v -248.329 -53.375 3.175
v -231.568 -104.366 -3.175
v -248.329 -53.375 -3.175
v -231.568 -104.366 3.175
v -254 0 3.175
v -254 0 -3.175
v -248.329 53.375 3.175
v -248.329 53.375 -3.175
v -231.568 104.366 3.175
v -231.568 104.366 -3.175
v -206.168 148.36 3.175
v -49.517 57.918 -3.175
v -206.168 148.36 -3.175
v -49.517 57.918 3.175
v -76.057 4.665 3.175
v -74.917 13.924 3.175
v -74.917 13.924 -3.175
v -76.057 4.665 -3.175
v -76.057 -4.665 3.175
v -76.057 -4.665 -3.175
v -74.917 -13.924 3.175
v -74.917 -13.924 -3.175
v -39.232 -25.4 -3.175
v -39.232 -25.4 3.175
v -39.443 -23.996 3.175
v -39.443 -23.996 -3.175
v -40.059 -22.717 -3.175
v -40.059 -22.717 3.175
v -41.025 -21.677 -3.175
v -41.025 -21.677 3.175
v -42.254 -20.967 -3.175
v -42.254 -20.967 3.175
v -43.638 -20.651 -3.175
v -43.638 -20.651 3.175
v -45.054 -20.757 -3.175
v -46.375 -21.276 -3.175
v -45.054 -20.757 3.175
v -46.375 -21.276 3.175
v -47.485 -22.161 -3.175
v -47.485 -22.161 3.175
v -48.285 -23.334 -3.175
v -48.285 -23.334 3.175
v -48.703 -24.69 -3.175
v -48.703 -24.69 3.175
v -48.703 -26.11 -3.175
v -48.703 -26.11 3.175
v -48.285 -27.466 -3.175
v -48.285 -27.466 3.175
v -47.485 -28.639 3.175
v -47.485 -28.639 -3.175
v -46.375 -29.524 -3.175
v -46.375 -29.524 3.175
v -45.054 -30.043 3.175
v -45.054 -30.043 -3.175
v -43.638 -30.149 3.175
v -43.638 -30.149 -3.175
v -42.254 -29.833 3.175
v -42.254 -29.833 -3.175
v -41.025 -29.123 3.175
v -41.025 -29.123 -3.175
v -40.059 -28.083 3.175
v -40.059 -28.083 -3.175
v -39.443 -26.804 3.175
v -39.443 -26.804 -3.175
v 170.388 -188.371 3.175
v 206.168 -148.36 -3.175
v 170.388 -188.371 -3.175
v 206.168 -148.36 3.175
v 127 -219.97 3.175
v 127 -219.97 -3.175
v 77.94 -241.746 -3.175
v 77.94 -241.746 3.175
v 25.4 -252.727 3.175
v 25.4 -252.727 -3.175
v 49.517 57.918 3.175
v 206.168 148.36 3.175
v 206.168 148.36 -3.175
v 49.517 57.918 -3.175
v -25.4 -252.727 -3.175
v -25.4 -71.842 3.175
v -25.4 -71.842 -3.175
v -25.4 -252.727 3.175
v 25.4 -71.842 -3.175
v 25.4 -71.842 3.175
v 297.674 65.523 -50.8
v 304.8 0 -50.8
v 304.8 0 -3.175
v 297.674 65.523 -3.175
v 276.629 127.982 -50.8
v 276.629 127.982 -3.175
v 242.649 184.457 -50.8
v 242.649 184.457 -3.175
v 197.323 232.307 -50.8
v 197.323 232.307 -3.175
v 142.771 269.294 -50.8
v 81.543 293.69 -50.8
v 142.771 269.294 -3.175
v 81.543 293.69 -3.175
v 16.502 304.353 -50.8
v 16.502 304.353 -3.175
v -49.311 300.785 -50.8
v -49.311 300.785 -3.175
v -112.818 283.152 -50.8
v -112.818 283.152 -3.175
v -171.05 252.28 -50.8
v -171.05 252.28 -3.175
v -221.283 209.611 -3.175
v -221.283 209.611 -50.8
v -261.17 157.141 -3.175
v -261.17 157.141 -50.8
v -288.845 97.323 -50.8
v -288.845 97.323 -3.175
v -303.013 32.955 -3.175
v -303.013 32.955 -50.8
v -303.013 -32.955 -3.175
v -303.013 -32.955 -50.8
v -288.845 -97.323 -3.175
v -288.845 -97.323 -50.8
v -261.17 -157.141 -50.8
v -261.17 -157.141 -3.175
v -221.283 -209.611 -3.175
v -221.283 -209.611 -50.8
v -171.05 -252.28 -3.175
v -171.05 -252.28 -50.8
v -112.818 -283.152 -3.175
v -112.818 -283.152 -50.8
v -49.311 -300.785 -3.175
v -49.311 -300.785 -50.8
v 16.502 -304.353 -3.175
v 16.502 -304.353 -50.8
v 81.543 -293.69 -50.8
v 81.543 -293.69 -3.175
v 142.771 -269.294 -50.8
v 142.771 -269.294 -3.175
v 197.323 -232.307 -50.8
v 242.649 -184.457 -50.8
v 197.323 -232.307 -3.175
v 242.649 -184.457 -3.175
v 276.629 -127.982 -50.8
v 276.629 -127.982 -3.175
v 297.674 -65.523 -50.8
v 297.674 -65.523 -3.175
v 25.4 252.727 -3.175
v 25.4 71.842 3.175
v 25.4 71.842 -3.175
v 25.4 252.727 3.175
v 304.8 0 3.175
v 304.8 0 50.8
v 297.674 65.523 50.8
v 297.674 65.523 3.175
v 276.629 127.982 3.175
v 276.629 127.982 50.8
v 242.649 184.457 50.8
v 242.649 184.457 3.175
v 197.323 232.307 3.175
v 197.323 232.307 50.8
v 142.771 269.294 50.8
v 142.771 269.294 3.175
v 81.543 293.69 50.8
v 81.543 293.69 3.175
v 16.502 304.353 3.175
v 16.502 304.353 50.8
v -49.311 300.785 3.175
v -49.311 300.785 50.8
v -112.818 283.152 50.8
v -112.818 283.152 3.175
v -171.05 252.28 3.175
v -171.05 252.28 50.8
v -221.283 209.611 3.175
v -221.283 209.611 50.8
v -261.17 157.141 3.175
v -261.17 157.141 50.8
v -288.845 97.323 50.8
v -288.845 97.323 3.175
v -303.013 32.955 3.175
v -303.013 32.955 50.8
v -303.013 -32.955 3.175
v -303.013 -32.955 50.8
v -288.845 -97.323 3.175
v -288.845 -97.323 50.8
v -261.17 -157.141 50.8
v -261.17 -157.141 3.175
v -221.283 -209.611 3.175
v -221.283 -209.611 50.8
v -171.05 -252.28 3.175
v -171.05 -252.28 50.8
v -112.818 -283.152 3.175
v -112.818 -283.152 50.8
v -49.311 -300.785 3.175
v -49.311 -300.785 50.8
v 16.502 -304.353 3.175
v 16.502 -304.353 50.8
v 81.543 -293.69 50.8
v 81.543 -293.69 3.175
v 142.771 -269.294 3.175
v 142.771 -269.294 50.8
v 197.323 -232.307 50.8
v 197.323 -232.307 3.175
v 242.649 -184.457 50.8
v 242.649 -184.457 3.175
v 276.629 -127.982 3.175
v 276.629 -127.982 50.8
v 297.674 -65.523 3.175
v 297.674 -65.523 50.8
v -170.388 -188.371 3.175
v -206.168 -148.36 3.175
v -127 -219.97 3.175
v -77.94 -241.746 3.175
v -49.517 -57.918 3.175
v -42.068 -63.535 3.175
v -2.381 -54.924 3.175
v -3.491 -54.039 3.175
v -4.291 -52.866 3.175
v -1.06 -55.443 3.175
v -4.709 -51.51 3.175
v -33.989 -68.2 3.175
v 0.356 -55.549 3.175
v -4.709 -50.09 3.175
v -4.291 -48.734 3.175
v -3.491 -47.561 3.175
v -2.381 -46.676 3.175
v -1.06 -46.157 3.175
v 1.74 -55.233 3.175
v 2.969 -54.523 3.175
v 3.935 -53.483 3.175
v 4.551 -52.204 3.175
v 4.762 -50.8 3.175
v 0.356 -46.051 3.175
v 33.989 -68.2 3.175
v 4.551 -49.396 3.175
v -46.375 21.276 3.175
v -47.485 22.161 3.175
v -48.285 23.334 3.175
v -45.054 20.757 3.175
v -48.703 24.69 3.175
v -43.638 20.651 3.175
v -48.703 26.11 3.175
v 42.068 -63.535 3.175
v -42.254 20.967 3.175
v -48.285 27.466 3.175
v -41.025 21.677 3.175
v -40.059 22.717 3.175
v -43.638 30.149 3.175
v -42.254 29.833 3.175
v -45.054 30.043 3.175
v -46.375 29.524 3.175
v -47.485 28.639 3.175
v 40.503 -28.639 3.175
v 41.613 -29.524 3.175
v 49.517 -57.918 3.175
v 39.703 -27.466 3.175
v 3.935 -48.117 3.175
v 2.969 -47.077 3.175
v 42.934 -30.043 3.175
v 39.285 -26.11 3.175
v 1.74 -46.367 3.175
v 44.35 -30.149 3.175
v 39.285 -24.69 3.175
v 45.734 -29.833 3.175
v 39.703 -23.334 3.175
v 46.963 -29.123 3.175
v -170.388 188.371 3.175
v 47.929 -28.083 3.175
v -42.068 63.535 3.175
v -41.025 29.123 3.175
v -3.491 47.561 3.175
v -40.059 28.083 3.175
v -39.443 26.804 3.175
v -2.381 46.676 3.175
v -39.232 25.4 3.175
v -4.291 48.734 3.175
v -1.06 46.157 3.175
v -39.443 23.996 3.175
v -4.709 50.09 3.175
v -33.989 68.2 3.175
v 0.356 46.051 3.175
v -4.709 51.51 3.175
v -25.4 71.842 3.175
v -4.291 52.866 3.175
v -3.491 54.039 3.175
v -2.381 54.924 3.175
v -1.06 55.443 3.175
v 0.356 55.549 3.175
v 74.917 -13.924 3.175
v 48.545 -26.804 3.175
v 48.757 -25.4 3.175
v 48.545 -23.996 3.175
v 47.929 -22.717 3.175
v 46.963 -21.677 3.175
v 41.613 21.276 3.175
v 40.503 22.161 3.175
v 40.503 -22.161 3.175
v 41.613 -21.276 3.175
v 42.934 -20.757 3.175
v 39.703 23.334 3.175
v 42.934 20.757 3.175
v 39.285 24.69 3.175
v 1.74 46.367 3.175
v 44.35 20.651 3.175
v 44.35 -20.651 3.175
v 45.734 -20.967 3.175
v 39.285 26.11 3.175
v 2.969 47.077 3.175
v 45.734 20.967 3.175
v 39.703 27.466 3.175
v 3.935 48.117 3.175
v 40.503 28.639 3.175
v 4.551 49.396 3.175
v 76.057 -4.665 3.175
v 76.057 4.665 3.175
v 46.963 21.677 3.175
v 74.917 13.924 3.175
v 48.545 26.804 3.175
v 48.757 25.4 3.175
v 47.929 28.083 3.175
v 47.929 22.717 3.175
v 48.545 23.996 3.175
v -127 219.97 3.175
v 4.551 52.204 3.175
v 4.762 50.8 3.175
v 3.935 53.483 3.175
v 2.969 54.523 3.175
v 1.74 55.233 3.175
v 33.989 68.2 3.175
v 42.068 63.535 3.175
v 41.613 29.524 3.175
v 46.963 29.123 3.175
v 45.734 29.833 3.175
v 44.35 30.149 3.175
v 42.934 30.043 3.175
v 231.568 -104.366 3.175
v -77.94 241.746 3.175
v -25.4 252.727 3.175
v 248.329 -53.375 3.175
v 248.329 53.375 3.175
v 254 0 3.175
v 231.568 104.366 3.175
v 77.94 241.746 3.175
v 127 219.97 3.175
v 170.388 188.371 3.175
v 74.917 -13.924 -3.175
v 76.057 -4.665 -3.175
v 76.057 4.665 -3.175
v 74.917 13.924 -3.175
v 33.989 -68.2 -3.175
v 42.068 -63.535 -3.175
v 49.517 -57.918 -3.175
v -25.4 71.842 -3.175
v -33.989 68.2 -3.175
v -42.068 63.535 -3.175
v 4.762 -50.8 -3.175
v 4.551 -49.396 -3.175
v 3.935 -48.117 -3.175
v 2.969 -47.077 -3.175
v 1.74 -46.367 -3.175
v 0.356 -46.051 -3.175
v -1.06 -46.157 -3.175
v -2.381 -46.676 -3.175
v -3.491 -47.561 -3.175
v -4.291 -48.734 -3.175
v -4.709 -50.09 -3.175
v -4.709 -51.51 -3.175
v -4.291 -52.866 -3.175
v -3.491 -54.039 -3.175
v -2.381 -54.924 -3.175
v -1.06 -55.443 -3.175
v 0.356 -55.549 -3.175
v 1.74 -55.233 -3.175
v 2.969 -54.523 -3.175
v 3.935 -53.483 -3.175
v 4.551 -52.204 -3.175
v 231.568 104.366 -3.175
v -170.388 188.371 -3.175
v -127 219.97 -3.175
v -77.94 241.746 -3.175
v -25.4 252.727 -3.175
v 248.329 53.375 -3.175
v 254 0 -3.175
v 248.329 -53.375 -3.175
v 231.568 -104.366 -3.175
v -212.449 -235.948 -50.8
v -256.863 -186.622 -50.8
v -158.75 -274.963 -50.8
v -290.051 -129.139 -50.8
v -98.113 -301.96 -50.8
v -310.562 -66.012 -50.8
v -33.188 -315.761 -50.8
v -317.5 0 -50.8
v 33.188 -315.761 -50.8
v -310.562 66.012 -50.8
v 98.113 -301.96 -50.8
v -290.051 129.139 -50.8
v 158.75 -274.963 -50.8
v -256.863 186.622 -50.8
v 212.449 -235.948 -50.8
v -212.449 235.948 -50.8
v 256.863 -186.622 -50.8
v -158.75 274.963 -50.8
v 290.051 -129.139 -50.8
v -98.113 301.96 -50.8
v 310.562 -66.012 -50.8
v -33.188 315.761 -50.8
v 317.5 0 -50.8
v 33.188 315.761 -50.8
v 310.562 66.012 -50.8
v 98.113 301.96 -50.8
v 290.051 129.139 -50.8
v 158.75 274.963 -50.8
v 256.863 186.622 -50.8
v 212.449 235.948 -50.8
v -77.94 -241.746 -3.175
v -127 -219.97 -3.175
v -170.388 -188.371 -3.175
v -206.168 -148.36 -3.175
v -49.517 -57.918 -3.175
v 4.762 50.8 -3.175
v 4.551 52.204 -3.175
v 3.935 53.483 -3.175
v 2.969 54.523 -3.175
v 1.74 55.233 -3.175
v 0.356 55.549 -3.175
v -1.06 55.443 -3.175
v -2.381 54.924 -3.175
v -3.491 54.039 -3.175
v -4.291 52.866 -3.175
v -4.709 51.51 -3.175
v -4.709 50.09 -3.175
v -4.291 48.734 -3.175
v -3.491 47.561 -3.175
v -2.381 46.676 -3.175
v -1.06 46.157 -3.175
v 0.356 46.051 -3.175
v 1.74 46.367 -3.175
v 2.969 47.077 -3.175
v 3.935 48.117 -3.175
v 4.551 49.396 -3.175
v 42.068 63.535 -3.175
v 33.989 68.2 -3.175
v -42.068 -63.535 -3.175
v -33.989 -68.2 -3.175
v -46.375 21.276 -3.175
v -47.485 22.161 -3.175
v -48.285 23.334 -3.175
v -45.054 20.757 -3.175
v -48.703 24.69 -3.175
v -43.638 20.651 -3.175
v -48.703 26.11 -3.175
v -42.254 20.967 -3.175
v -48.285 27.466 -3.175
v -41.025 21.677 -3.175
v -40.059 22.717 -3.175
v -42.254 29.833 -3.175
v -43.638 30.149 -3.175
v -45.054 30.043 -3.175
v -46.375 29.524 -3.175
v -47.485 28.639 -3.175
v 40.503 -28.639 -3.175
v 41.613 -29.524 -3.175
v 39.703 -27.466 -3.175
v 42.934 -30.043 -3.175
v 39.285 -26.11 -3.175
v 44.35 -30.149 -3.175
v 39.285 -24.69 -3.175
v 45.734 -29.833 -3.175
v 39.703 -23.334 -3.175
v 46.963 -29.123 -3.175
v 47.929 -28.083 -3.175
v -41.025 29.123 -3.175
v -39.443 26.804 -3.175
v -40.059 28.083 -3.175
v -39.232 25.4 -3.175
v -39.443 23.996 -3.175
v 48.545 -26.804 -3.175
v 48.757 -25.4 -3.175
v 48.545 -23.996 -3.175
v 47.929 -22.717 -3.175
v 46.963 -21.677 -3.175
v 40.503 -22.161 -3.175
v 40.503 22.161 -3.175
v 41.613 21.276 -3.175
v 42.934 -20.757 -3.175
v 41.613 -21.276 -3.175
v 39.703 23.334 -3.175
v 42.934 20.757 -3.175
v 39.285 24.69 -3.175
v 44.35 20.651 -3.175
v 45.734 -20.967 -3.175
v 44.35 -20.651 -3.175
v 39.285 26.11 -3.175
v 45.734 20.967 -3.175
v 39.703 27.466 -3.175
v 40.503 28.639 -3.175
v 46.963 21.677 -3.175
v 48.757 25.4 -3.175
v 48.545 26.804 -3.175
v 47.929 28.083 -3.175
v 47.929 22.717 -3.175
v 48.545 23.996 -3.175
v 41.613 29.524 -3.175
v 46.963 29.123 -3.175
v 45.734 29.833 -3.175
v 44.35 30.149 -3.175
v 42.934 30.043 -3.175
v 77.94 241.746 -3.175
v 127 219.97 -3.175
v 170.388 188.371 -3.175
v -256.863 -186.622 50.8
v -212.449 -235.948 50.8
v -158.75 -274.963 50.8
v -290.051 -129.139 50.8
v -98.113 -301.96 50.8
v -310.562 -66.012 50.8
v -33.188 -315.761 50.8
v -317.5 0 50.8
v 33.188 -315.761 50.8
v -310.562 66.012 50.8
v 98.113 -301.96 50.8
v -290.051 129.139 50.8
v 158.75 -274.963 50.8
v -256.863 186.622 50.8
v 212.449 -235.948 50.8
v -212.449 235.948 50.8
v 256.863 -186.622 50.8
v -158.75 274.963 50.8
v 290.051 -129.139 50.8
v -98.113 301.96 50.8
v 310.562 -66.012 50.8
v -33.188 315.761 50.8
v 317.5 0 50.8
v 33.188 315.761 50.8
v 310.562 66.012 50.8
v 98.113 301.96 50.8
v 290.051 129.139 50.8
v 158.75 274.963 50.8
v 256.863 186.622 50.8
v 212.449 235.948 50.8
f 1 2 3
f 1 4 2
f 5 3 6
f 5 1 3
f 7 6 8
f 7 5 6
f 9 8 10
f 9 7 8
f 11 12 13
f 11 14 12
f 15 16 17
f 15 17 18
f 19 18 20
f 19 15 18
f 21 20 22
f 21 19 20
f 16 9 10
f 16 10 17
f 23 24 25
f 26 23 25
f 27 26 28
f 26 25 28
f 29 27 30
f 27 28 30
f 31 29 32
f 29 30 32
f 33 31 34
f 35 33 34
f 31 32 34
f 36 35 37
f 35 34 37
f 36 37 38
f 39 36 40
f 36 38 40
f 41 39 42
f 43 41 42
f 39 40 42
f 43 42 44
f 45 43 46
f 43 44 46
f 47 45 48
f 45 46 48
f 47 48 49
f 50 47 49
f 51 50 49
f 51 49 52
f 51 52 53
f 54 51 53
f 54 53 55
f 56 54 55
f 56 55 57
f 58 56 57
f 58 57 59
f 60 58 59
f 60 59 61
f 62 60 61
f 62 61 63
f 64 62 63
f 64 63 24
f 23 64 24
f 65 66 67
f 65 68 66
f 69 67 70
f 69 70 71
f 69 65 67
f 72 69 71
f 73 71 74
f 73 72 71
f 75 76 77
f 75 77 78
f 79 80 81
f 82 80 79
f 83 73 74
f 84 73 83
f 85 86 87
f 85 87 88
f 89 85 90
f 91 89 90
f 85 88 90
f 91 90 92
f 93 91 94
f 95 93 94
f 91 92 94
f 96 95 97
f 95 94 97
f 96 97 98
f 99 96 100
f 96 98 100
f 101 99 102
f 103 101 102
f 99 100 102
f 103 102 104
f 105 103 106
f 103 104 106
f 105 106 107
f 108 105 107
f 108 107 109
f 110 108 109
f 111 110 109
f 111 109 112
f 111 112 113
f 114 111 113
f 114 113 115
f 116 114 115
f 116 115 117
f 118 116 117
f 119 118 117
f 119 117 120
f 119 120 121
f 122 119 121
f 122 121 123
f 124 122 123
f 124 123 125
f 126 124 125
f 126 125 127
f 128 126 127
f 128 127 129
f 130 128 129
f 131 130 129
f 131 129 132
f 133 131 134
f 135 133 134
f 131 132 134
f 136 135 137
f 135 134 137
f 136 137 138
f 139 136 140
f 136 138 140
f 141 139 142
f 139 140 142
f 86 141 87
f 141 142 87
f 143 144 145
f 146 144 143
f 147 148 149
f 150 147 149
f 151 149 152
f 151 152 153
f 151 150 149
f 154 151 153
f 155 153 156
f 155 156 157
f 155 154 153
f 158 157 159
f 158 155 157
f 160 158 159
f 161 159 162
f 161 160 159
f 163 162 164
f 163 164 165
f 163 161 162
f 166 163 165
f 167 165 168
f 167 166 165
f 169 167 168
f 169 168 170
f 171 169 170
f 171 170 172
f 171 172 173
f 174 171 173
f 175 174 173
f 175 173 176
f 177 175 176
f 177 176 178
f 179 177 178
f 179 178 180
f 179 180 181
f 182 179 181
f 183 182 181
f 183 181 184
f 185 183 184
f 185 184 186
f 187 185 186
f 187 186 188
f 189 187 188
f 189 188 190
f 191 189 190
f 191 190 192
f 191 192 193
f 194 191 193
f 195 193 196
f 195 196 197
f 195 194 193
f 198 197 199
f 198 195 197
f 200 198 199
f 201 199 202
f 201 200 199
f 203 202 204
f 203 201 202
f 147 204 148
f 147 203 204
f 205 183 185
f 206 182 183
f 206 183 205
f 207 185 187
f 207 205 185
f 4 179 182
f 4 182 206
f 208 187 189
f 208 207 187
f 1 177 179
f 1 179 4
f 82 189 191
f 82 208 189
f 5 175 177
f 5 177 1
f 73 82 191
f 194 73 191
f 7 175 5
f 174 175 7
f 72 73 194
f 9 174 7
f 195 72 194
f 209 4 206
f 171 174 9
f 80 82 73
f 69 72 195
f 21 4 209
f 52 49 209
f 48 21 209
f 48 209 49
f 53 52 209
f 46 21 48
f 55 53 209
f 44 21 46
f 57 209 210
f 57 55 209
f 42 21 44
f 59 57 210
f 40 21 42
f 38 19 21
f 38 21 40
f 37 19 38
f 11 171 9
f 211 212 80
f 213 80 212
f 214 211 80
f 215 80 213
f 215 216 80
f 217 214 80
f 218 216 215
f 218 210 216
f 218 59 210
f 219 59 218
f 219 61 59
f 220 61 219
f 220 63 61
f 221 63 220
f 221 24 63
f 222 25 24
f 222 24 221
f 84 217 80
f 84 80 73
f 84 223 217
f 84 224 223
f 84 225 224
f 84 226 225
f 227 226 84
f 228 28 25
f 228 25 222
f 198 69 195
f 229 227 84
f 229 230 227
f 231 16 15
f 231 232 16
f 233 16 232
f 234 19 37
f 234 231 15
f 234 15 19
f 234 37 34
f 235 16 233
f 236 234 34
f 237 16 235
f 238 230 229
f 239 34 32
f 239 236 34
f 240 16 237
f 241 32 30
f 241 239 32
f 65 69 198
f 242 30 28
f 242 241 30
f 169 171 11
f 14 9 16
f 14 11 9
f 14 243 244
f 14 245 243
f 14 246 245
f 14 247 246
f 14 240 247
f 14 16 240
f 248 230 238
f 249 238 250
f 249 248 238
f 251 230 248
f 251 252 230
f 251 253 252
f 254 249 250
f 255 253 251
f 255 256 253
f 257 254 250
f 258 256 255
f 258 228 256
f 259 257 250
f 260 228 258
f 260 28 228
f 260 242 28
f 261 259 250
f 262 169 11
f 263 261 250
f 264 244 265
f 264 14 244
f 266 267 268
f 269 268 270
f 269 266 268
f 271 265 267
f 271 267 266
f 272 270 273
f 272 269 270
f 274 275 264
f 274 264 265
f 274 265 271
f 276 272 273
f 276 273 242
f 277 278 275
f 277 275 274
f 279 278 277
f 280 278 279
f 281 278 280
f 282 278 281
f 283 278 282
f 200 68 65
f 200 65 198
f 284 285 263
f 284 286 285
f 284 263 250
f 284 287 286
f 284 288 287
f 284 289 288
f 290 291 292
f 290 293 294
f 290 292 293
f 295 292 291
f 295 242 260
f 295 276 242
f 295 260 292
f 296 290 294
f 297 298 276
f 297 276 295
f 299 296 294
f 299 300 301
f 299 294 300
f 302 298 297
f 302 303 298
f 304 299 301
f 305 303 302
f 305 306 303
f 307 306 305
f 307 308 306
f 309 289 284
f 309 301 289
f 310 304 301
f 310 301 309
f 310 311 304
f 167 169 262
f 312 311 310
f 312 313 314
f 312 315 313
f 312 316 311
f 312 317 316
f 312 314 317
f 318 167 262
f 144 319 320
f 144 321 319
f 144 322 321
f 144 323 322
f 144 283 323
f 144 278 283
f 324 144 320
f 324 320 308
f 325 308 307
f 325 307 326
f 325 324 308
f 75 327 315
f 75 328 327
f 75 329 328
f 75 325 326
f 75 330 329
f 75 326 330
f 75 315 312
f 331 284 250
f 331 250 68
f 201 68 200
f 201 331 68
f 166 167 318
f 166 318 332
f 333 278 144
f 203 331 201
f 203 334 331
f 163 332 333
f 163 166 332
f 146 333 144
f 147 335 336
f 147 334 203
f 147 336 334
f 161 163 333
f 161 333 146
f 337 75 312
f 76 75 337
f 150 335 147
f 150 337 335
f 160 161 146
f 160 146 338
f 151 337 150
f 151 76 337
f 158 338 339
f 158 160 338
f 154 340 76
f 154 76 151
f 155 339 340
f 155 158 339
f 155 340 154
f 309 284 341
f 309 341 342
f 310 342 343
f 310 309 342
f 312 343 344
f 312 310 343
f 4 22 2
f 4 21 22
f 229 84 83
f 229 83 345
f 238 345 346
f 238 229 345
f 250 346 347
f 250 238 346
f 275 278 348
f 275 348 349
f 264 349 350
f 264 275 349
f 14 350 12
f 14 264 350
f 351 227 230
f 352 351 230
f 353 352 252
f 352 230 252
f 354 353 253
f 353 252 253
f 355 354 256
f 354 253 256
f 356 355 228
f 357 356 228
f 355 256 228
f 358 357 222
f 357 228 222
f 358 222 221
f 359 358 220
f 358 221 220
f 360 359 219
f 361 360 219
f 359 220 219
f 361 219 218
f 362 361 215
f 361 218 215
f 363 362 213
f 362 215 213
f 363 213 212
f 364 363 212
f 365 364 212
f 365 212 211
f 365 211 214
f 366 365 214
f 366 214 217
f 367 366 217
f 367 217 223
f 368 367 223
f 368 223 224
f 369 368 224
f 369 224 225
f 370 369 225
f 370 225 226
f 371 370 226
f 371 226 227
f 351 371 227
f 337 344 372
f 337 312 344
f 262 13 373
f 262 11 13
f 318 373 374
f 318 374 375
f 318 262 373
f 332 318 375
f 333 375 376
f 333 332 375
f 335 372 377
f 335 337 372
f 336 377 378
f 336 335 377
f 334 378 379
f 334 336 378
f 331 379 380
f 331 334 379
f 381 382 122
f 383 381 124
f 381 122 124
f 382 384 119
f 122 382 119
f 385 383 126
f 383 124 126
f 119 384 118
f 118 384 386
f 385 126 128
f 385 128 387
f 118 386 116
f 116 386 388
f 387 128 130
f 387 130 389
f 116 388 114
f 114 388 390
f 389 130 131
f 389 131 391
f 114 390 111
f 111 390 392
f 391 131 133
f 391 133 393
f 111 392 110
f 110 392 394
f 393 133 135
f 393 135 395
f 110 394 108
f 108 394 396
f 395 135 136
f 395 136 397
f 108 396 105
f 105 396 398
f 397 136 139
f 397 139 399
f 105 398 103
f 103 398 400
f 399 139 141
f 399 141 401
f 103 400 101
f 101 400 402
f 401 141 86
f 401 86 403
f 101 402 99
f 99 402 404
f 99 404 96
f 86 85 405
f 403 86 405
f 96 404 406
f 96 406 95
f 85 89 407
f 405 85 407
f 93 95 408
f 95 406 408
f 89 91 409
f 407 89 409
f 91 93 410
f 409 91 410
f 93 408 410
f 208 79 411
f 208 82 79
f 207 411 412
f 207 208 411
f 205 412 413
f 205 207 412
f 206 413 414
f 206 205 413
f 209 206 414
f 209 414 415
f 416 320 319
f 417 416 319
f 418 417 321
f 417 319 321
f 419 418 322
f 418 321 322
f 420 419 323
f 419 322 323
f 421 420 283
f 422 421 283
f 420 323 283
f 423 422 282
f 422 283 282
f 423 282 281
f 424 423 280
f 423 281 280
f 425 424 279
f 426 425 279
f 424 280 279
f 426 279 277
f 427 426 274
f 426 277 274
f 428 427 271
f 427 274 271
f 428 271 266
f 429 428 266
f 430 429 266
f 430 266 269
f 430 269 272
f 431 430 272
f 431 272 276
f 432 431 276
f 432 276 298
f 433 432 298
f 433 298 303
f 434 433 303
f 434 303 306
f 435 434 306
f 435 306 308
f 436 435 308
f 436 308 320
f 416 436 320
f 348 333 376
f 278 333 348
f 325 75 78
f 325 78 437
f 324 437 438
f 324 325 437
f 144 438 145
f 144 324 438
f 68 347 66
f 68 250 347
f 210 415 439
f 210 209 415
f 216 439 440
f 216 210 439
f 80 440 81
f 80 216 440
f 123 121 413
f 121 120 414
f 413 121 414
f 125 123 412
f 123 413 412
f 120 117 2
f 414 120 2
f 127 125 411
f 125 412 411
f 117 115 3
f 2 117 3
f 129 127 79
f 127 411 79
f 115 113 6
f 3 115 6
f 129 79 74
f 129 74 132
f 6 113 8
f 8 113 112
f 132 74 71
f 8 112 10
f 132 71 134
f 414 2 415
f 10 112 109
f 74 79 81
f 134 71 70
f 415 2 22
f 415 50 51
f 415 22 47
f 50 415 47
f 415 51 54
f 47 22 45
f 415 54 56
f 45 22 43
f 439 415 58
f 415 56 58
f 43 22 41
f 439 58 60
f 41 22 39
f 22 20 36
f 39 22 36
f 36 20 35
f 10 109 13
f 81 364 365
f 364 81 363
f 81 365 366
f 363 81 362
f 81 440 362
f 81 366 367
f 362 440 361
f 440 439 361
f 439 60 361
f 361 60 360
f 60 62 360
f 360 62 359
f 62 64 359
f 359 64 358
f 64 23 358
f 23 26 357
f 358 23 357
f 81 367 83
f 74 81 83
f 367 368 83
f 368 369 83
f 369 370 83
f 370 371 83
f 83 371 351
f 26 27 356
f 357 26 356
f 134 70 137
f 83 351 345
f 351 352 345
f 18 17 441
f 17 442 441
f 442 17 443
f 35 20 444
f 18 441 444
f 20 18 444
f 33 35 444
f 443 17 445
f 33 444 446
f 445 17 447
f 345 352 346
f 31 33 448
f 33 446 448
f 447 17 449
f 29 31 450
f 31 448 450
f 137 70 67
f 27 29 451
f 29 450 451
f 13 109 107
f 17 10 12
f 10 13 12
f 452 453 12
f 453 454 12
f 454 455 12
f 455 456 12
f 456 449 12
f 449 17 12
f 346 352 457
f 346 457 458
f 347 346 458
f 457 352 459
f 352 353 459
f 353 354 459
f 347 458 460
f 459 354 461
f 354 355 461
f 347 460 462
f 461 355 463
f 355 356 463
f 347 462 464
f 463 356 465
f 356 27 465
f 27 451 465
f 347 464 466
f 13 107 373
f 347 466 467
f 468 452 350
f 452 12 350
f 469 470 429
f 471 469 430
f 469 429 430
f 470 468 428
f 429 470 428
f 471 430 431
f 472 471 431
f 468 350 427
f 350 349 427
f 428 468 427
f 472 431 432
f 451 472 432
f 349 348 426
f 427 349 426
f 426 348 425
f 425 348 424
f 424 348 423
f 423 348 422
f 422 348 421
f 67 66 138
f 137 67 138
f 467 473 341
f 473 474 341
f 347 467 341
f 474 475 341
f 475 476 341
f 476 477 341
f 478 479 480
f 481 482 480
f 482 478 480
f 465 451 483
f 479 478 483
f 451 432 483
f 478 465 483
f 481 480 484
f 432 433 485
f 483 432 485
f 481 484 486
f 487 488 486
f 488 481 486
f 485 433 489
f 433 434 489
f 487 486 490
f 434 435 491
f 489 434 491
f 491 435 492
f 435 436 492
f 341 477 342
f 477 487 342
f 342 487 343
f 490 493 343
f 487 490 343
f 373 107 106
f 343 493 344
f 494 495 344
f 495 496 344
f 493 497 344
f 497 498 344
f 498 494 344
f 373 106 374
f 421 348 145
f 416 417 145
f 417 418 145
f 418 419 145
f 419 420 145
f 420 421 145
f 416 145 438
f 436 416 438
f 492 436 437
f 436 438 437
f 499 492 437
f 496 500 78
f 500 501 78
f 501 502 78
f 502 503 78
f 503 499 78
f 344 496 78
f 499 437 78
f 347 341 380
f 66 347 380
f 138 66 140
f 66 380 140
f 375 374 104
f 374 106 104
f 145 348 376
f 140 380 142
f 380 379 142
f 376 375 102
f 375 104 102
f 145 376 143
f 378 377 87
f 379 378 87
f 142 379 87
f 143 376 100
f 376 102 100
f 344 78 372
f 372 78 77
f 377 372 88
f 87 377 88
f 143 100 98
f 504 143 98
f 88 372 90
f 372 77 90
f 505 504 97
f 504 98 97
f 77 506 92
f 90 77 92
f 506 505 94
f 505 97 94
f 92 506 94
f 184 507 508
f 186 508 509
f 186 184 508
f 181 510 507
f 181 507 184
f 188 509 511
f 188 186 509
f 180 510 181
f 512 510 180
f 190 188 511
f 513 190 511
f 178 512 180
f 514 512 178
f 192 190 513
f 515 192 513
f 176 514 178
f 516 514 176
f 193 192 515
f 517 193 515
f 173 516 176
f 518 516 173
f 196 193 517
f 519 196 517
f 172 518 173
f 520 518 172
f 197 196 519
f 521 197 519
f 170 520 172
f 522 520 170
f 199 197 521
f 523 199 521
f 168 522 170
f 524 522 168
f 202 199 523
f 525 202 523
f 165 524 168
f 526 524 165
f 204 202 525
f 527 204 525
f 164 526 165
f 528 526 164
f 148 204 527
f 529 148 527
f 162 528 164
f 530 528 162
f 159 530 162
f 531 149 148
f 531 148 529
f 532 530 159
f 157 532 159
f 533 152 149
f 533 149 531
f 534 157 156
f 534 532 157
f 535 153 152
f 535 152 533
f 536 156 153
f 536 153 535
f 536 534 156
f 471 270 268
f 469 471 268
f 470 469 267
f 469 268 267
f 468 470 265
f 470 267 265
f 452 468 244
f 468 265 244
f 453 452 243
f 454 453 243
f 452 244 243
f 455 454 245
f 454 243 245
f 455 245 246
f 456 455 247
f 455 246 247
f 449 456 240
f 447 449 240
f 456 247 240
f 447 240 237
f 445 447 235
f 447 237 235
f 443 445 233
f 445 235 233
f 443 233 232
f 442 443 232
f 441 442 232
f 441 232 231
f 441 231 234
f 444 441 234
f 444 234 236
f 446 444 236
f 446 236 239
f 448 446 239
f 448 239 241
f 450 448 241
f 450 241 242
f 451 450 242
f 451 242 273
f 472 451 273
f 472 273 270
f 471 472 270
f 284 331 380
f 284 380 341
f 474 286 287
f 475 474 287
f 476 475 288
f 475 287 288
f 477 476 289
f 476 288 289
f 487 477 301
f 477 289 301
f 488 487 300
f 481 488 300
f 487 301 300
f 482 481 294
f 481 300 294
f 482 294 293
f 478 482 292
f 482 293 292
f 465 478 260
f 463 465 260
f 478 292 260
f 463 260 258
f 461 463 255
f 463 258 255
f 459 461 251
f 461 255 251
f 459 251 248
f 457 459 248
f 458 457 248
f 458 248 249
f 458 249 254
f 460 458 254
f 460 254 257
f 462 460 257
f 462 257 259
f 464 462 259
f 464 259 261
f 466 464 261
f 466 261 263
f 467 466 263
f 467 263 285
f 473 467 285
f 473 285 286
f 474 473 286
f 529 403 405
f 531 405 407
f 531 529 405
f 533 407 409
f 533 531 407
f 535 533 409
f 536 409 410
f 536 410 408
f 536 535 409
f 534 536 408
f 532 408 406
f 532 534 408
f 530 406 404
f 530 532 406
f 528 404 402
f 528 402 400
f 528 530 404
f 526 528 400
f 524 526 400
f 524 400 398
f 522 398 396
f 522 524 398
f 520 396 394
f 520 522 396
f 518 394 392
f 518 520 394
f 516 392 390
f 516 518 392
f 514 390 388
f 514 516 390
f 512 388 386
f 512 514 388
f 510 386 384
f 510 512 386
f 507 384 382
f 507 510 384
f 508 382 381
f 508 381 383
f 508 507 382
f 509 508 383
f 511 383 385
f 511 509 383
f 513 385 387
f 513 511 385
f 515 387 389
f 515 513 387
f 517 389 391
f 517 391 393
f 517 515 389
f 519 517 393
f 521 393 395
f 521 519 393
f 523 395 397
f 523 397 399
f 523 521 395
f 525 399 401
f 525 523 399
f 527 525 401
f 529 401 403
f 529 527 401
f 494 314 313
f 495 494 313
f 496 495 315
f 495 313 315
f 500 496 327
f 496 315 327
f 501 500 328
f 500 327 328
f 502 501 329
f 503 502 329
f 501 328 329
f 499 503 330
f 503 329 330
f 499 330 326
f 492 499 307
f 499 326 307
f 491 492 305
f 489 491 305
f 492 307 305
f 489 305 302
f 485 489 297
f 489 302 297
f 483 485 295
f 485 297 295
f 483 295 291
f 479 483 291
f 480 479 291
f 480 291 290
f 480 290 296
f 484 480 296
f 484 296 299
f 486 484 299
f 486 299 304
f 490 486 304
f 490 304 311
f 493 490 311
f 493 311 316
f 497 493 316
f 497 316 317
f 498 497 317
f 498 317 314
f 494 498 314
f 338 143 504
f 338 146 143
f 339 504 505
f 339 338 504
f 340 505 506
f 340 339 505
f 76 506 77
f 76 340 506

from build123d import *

# Parameters (mm, degrees)
BOSS_EXTRUDE1_DEPTH      = 3.175
BOSS_EXTRUDE1_DEPTH_BACK = 3.175
SKETCH2_R                = 304.8
BOSS_EXTRUDE2_DEPTH      = 50.8
BOSS_EXTRUDE2_DEPTH_BACK = 50.8
SKETCH5_R                = 317.5
SKETCH5_R_2              = 304.8
SKETCH6_R                = 4.7625
CUT_EXTRUDE1_DEPTH       = 453.245288118


with BuildPart() as part:
    # Sketch2 → Boss-Extrude1 (new, two sides: drawn at the far end of the back side and taken through both)
    with BuildSketch(Plane.XY.offset(-BOSS_EXTRUDE1_DEPTH_BACK)):
        Circle(SKETCH2_R)
        with BuildLine():
            ThreePointArc((25.4, -71.842048969), (38.1, -65.991135768), (49.517039467, -57.91806974))
            Line((49.517039467, -57.91806974), (206.167836833, -148.360449769))
            ThreePointArc((206.167836833, -148.360449769), (127, -219.970452561), (25.4, -252.726809025))
            Line((25.4, -252.726809025), (25.4, -71.842048969))
        make_face(mode=Mode.SUBTRACT)
        with BuildLine():
            ThreePointArc((-49.517039467, -57.91806974), (-38.1, -65.991135768), (-25.4, -71.842048969))
            Line((-25.4, -71.842048969), (-25.4, -252.726809025))
            ThreePointArc((-25.4, -252.726809025), (-127, -219.970452561), (-206.167836833, -148.360449769))
            Line((-206.167836833, -148.360449769), (-49.517039467, -57.91806974))
        make_face(mode=Mode.SUBTRACT)
        with BuildLine():
            ThreePointArc((-74.917039467, 13.923979228), (-76.2, 0), (-74.917039467, -13.923979228))
            Line((-74.917039467, -13.923979228), (-231.567836833, -104.366359256))
            ThreePointArc((-231.567836833, -104.366359256), (-254, 0), (-231.567836833, 104.366359256))
            Line((-231.567836833, 104.366359256), (-74.917039467, 13.923979228))
        make_face(mode=Mode.SUBTRACT)
        with BuildLine():
            ThreePointArc((-25.4, 71.842048969), (-38.1, 65.991135768), (-49.517039467, 57.91806974))
            Line((-49.517039467, 57.91806974), (-206.167836833, 148.360449769))
            ThreePointArc((-206.167836833, 148.360449769), (-127, 219.970452561), (-25.4, 252.726809025))
            Line((-25.4, 252.726809025), (-25.4, 71.842048969))
        make_face(mode=Mode.SUBTRACT)
        with BuildLine():
            ThreePointArc((49.517039467, 57.91806974), (38.1, 65.991135768), (25.4, 71.842048969))
            Line((25.4, 71.842048969), (25.4, 252.726809025))
            ThreePointArc((25.4, 252.726809025), (127, 219.970452561), (206.167836833, 148.360449769))
            Line((206.167836833, 148.360449769), (49.517039467, 57.91806974))
        make_face(mode=Mode.SUBTRACT)
        with BuildLine():
            Line((74.917039467, 13.923979228), (231.567836833, 104.366359256))
            ThreePointArc((231.567836833, 104.366359256), (254, 0), (231.567836833, -104.366359256))
            Line((231.567836833, -104.366359256), (74.917039467, -13.923979228))
            ThreePointArc((74.917039467, -13.923979228), (76.2, 0), (74.917039467, 13.923979228))
        make_face(mode=Mode.SUBTRACT)
    extrude(amount=BOSS_EXTRUDE1_DEPTH + BOSS_EXTRUDE1_DEPTH_BACK)

    # Sketch5 → Boss-Extrude2 (add, two sides: drawn at the far end of the back side and taken through both)
    with BuildSketch(Plane.XY.offset(-BOSS_EXTRUDE2_DEPTH_BACK)):
        Circle(SKETCH5_R)
        Circle(SKETCH5_R_2, mode=Mode.SUBTRACT)
    extrude(amount=BOSS_EXTRUDE2_DEPTH + BOSS_EXTRUDE2_DEPTH_BACK)

    # Sketch6 → Cut-Extrude1 (cut, through all)
    with BuildSketch(Plane.XY.offset(3.175)):
        with Locations((0, 50.8)):
            Circle(SKETCH6_R)
        with Locations((43.994090512, 25.4)):
            Circle(SKETCH6_R)
        with Locations((43.994090512, -25.4)):
            Circle(SKETCH6_R)
        with Locations((0, -50.8)):
            Circle(SKETCH6_R)
        with Locations((-43.994090512, -25.4)):
            Circle(SKETCH6_R)
        with Locations((-43.994090512, 25.4)):
            Circle(SKETCH6_R)
    extrude(amount=-CUT_EXTRUDE1_DEPTH, mode=Mode.SUBTRACT)


solid = part.part
